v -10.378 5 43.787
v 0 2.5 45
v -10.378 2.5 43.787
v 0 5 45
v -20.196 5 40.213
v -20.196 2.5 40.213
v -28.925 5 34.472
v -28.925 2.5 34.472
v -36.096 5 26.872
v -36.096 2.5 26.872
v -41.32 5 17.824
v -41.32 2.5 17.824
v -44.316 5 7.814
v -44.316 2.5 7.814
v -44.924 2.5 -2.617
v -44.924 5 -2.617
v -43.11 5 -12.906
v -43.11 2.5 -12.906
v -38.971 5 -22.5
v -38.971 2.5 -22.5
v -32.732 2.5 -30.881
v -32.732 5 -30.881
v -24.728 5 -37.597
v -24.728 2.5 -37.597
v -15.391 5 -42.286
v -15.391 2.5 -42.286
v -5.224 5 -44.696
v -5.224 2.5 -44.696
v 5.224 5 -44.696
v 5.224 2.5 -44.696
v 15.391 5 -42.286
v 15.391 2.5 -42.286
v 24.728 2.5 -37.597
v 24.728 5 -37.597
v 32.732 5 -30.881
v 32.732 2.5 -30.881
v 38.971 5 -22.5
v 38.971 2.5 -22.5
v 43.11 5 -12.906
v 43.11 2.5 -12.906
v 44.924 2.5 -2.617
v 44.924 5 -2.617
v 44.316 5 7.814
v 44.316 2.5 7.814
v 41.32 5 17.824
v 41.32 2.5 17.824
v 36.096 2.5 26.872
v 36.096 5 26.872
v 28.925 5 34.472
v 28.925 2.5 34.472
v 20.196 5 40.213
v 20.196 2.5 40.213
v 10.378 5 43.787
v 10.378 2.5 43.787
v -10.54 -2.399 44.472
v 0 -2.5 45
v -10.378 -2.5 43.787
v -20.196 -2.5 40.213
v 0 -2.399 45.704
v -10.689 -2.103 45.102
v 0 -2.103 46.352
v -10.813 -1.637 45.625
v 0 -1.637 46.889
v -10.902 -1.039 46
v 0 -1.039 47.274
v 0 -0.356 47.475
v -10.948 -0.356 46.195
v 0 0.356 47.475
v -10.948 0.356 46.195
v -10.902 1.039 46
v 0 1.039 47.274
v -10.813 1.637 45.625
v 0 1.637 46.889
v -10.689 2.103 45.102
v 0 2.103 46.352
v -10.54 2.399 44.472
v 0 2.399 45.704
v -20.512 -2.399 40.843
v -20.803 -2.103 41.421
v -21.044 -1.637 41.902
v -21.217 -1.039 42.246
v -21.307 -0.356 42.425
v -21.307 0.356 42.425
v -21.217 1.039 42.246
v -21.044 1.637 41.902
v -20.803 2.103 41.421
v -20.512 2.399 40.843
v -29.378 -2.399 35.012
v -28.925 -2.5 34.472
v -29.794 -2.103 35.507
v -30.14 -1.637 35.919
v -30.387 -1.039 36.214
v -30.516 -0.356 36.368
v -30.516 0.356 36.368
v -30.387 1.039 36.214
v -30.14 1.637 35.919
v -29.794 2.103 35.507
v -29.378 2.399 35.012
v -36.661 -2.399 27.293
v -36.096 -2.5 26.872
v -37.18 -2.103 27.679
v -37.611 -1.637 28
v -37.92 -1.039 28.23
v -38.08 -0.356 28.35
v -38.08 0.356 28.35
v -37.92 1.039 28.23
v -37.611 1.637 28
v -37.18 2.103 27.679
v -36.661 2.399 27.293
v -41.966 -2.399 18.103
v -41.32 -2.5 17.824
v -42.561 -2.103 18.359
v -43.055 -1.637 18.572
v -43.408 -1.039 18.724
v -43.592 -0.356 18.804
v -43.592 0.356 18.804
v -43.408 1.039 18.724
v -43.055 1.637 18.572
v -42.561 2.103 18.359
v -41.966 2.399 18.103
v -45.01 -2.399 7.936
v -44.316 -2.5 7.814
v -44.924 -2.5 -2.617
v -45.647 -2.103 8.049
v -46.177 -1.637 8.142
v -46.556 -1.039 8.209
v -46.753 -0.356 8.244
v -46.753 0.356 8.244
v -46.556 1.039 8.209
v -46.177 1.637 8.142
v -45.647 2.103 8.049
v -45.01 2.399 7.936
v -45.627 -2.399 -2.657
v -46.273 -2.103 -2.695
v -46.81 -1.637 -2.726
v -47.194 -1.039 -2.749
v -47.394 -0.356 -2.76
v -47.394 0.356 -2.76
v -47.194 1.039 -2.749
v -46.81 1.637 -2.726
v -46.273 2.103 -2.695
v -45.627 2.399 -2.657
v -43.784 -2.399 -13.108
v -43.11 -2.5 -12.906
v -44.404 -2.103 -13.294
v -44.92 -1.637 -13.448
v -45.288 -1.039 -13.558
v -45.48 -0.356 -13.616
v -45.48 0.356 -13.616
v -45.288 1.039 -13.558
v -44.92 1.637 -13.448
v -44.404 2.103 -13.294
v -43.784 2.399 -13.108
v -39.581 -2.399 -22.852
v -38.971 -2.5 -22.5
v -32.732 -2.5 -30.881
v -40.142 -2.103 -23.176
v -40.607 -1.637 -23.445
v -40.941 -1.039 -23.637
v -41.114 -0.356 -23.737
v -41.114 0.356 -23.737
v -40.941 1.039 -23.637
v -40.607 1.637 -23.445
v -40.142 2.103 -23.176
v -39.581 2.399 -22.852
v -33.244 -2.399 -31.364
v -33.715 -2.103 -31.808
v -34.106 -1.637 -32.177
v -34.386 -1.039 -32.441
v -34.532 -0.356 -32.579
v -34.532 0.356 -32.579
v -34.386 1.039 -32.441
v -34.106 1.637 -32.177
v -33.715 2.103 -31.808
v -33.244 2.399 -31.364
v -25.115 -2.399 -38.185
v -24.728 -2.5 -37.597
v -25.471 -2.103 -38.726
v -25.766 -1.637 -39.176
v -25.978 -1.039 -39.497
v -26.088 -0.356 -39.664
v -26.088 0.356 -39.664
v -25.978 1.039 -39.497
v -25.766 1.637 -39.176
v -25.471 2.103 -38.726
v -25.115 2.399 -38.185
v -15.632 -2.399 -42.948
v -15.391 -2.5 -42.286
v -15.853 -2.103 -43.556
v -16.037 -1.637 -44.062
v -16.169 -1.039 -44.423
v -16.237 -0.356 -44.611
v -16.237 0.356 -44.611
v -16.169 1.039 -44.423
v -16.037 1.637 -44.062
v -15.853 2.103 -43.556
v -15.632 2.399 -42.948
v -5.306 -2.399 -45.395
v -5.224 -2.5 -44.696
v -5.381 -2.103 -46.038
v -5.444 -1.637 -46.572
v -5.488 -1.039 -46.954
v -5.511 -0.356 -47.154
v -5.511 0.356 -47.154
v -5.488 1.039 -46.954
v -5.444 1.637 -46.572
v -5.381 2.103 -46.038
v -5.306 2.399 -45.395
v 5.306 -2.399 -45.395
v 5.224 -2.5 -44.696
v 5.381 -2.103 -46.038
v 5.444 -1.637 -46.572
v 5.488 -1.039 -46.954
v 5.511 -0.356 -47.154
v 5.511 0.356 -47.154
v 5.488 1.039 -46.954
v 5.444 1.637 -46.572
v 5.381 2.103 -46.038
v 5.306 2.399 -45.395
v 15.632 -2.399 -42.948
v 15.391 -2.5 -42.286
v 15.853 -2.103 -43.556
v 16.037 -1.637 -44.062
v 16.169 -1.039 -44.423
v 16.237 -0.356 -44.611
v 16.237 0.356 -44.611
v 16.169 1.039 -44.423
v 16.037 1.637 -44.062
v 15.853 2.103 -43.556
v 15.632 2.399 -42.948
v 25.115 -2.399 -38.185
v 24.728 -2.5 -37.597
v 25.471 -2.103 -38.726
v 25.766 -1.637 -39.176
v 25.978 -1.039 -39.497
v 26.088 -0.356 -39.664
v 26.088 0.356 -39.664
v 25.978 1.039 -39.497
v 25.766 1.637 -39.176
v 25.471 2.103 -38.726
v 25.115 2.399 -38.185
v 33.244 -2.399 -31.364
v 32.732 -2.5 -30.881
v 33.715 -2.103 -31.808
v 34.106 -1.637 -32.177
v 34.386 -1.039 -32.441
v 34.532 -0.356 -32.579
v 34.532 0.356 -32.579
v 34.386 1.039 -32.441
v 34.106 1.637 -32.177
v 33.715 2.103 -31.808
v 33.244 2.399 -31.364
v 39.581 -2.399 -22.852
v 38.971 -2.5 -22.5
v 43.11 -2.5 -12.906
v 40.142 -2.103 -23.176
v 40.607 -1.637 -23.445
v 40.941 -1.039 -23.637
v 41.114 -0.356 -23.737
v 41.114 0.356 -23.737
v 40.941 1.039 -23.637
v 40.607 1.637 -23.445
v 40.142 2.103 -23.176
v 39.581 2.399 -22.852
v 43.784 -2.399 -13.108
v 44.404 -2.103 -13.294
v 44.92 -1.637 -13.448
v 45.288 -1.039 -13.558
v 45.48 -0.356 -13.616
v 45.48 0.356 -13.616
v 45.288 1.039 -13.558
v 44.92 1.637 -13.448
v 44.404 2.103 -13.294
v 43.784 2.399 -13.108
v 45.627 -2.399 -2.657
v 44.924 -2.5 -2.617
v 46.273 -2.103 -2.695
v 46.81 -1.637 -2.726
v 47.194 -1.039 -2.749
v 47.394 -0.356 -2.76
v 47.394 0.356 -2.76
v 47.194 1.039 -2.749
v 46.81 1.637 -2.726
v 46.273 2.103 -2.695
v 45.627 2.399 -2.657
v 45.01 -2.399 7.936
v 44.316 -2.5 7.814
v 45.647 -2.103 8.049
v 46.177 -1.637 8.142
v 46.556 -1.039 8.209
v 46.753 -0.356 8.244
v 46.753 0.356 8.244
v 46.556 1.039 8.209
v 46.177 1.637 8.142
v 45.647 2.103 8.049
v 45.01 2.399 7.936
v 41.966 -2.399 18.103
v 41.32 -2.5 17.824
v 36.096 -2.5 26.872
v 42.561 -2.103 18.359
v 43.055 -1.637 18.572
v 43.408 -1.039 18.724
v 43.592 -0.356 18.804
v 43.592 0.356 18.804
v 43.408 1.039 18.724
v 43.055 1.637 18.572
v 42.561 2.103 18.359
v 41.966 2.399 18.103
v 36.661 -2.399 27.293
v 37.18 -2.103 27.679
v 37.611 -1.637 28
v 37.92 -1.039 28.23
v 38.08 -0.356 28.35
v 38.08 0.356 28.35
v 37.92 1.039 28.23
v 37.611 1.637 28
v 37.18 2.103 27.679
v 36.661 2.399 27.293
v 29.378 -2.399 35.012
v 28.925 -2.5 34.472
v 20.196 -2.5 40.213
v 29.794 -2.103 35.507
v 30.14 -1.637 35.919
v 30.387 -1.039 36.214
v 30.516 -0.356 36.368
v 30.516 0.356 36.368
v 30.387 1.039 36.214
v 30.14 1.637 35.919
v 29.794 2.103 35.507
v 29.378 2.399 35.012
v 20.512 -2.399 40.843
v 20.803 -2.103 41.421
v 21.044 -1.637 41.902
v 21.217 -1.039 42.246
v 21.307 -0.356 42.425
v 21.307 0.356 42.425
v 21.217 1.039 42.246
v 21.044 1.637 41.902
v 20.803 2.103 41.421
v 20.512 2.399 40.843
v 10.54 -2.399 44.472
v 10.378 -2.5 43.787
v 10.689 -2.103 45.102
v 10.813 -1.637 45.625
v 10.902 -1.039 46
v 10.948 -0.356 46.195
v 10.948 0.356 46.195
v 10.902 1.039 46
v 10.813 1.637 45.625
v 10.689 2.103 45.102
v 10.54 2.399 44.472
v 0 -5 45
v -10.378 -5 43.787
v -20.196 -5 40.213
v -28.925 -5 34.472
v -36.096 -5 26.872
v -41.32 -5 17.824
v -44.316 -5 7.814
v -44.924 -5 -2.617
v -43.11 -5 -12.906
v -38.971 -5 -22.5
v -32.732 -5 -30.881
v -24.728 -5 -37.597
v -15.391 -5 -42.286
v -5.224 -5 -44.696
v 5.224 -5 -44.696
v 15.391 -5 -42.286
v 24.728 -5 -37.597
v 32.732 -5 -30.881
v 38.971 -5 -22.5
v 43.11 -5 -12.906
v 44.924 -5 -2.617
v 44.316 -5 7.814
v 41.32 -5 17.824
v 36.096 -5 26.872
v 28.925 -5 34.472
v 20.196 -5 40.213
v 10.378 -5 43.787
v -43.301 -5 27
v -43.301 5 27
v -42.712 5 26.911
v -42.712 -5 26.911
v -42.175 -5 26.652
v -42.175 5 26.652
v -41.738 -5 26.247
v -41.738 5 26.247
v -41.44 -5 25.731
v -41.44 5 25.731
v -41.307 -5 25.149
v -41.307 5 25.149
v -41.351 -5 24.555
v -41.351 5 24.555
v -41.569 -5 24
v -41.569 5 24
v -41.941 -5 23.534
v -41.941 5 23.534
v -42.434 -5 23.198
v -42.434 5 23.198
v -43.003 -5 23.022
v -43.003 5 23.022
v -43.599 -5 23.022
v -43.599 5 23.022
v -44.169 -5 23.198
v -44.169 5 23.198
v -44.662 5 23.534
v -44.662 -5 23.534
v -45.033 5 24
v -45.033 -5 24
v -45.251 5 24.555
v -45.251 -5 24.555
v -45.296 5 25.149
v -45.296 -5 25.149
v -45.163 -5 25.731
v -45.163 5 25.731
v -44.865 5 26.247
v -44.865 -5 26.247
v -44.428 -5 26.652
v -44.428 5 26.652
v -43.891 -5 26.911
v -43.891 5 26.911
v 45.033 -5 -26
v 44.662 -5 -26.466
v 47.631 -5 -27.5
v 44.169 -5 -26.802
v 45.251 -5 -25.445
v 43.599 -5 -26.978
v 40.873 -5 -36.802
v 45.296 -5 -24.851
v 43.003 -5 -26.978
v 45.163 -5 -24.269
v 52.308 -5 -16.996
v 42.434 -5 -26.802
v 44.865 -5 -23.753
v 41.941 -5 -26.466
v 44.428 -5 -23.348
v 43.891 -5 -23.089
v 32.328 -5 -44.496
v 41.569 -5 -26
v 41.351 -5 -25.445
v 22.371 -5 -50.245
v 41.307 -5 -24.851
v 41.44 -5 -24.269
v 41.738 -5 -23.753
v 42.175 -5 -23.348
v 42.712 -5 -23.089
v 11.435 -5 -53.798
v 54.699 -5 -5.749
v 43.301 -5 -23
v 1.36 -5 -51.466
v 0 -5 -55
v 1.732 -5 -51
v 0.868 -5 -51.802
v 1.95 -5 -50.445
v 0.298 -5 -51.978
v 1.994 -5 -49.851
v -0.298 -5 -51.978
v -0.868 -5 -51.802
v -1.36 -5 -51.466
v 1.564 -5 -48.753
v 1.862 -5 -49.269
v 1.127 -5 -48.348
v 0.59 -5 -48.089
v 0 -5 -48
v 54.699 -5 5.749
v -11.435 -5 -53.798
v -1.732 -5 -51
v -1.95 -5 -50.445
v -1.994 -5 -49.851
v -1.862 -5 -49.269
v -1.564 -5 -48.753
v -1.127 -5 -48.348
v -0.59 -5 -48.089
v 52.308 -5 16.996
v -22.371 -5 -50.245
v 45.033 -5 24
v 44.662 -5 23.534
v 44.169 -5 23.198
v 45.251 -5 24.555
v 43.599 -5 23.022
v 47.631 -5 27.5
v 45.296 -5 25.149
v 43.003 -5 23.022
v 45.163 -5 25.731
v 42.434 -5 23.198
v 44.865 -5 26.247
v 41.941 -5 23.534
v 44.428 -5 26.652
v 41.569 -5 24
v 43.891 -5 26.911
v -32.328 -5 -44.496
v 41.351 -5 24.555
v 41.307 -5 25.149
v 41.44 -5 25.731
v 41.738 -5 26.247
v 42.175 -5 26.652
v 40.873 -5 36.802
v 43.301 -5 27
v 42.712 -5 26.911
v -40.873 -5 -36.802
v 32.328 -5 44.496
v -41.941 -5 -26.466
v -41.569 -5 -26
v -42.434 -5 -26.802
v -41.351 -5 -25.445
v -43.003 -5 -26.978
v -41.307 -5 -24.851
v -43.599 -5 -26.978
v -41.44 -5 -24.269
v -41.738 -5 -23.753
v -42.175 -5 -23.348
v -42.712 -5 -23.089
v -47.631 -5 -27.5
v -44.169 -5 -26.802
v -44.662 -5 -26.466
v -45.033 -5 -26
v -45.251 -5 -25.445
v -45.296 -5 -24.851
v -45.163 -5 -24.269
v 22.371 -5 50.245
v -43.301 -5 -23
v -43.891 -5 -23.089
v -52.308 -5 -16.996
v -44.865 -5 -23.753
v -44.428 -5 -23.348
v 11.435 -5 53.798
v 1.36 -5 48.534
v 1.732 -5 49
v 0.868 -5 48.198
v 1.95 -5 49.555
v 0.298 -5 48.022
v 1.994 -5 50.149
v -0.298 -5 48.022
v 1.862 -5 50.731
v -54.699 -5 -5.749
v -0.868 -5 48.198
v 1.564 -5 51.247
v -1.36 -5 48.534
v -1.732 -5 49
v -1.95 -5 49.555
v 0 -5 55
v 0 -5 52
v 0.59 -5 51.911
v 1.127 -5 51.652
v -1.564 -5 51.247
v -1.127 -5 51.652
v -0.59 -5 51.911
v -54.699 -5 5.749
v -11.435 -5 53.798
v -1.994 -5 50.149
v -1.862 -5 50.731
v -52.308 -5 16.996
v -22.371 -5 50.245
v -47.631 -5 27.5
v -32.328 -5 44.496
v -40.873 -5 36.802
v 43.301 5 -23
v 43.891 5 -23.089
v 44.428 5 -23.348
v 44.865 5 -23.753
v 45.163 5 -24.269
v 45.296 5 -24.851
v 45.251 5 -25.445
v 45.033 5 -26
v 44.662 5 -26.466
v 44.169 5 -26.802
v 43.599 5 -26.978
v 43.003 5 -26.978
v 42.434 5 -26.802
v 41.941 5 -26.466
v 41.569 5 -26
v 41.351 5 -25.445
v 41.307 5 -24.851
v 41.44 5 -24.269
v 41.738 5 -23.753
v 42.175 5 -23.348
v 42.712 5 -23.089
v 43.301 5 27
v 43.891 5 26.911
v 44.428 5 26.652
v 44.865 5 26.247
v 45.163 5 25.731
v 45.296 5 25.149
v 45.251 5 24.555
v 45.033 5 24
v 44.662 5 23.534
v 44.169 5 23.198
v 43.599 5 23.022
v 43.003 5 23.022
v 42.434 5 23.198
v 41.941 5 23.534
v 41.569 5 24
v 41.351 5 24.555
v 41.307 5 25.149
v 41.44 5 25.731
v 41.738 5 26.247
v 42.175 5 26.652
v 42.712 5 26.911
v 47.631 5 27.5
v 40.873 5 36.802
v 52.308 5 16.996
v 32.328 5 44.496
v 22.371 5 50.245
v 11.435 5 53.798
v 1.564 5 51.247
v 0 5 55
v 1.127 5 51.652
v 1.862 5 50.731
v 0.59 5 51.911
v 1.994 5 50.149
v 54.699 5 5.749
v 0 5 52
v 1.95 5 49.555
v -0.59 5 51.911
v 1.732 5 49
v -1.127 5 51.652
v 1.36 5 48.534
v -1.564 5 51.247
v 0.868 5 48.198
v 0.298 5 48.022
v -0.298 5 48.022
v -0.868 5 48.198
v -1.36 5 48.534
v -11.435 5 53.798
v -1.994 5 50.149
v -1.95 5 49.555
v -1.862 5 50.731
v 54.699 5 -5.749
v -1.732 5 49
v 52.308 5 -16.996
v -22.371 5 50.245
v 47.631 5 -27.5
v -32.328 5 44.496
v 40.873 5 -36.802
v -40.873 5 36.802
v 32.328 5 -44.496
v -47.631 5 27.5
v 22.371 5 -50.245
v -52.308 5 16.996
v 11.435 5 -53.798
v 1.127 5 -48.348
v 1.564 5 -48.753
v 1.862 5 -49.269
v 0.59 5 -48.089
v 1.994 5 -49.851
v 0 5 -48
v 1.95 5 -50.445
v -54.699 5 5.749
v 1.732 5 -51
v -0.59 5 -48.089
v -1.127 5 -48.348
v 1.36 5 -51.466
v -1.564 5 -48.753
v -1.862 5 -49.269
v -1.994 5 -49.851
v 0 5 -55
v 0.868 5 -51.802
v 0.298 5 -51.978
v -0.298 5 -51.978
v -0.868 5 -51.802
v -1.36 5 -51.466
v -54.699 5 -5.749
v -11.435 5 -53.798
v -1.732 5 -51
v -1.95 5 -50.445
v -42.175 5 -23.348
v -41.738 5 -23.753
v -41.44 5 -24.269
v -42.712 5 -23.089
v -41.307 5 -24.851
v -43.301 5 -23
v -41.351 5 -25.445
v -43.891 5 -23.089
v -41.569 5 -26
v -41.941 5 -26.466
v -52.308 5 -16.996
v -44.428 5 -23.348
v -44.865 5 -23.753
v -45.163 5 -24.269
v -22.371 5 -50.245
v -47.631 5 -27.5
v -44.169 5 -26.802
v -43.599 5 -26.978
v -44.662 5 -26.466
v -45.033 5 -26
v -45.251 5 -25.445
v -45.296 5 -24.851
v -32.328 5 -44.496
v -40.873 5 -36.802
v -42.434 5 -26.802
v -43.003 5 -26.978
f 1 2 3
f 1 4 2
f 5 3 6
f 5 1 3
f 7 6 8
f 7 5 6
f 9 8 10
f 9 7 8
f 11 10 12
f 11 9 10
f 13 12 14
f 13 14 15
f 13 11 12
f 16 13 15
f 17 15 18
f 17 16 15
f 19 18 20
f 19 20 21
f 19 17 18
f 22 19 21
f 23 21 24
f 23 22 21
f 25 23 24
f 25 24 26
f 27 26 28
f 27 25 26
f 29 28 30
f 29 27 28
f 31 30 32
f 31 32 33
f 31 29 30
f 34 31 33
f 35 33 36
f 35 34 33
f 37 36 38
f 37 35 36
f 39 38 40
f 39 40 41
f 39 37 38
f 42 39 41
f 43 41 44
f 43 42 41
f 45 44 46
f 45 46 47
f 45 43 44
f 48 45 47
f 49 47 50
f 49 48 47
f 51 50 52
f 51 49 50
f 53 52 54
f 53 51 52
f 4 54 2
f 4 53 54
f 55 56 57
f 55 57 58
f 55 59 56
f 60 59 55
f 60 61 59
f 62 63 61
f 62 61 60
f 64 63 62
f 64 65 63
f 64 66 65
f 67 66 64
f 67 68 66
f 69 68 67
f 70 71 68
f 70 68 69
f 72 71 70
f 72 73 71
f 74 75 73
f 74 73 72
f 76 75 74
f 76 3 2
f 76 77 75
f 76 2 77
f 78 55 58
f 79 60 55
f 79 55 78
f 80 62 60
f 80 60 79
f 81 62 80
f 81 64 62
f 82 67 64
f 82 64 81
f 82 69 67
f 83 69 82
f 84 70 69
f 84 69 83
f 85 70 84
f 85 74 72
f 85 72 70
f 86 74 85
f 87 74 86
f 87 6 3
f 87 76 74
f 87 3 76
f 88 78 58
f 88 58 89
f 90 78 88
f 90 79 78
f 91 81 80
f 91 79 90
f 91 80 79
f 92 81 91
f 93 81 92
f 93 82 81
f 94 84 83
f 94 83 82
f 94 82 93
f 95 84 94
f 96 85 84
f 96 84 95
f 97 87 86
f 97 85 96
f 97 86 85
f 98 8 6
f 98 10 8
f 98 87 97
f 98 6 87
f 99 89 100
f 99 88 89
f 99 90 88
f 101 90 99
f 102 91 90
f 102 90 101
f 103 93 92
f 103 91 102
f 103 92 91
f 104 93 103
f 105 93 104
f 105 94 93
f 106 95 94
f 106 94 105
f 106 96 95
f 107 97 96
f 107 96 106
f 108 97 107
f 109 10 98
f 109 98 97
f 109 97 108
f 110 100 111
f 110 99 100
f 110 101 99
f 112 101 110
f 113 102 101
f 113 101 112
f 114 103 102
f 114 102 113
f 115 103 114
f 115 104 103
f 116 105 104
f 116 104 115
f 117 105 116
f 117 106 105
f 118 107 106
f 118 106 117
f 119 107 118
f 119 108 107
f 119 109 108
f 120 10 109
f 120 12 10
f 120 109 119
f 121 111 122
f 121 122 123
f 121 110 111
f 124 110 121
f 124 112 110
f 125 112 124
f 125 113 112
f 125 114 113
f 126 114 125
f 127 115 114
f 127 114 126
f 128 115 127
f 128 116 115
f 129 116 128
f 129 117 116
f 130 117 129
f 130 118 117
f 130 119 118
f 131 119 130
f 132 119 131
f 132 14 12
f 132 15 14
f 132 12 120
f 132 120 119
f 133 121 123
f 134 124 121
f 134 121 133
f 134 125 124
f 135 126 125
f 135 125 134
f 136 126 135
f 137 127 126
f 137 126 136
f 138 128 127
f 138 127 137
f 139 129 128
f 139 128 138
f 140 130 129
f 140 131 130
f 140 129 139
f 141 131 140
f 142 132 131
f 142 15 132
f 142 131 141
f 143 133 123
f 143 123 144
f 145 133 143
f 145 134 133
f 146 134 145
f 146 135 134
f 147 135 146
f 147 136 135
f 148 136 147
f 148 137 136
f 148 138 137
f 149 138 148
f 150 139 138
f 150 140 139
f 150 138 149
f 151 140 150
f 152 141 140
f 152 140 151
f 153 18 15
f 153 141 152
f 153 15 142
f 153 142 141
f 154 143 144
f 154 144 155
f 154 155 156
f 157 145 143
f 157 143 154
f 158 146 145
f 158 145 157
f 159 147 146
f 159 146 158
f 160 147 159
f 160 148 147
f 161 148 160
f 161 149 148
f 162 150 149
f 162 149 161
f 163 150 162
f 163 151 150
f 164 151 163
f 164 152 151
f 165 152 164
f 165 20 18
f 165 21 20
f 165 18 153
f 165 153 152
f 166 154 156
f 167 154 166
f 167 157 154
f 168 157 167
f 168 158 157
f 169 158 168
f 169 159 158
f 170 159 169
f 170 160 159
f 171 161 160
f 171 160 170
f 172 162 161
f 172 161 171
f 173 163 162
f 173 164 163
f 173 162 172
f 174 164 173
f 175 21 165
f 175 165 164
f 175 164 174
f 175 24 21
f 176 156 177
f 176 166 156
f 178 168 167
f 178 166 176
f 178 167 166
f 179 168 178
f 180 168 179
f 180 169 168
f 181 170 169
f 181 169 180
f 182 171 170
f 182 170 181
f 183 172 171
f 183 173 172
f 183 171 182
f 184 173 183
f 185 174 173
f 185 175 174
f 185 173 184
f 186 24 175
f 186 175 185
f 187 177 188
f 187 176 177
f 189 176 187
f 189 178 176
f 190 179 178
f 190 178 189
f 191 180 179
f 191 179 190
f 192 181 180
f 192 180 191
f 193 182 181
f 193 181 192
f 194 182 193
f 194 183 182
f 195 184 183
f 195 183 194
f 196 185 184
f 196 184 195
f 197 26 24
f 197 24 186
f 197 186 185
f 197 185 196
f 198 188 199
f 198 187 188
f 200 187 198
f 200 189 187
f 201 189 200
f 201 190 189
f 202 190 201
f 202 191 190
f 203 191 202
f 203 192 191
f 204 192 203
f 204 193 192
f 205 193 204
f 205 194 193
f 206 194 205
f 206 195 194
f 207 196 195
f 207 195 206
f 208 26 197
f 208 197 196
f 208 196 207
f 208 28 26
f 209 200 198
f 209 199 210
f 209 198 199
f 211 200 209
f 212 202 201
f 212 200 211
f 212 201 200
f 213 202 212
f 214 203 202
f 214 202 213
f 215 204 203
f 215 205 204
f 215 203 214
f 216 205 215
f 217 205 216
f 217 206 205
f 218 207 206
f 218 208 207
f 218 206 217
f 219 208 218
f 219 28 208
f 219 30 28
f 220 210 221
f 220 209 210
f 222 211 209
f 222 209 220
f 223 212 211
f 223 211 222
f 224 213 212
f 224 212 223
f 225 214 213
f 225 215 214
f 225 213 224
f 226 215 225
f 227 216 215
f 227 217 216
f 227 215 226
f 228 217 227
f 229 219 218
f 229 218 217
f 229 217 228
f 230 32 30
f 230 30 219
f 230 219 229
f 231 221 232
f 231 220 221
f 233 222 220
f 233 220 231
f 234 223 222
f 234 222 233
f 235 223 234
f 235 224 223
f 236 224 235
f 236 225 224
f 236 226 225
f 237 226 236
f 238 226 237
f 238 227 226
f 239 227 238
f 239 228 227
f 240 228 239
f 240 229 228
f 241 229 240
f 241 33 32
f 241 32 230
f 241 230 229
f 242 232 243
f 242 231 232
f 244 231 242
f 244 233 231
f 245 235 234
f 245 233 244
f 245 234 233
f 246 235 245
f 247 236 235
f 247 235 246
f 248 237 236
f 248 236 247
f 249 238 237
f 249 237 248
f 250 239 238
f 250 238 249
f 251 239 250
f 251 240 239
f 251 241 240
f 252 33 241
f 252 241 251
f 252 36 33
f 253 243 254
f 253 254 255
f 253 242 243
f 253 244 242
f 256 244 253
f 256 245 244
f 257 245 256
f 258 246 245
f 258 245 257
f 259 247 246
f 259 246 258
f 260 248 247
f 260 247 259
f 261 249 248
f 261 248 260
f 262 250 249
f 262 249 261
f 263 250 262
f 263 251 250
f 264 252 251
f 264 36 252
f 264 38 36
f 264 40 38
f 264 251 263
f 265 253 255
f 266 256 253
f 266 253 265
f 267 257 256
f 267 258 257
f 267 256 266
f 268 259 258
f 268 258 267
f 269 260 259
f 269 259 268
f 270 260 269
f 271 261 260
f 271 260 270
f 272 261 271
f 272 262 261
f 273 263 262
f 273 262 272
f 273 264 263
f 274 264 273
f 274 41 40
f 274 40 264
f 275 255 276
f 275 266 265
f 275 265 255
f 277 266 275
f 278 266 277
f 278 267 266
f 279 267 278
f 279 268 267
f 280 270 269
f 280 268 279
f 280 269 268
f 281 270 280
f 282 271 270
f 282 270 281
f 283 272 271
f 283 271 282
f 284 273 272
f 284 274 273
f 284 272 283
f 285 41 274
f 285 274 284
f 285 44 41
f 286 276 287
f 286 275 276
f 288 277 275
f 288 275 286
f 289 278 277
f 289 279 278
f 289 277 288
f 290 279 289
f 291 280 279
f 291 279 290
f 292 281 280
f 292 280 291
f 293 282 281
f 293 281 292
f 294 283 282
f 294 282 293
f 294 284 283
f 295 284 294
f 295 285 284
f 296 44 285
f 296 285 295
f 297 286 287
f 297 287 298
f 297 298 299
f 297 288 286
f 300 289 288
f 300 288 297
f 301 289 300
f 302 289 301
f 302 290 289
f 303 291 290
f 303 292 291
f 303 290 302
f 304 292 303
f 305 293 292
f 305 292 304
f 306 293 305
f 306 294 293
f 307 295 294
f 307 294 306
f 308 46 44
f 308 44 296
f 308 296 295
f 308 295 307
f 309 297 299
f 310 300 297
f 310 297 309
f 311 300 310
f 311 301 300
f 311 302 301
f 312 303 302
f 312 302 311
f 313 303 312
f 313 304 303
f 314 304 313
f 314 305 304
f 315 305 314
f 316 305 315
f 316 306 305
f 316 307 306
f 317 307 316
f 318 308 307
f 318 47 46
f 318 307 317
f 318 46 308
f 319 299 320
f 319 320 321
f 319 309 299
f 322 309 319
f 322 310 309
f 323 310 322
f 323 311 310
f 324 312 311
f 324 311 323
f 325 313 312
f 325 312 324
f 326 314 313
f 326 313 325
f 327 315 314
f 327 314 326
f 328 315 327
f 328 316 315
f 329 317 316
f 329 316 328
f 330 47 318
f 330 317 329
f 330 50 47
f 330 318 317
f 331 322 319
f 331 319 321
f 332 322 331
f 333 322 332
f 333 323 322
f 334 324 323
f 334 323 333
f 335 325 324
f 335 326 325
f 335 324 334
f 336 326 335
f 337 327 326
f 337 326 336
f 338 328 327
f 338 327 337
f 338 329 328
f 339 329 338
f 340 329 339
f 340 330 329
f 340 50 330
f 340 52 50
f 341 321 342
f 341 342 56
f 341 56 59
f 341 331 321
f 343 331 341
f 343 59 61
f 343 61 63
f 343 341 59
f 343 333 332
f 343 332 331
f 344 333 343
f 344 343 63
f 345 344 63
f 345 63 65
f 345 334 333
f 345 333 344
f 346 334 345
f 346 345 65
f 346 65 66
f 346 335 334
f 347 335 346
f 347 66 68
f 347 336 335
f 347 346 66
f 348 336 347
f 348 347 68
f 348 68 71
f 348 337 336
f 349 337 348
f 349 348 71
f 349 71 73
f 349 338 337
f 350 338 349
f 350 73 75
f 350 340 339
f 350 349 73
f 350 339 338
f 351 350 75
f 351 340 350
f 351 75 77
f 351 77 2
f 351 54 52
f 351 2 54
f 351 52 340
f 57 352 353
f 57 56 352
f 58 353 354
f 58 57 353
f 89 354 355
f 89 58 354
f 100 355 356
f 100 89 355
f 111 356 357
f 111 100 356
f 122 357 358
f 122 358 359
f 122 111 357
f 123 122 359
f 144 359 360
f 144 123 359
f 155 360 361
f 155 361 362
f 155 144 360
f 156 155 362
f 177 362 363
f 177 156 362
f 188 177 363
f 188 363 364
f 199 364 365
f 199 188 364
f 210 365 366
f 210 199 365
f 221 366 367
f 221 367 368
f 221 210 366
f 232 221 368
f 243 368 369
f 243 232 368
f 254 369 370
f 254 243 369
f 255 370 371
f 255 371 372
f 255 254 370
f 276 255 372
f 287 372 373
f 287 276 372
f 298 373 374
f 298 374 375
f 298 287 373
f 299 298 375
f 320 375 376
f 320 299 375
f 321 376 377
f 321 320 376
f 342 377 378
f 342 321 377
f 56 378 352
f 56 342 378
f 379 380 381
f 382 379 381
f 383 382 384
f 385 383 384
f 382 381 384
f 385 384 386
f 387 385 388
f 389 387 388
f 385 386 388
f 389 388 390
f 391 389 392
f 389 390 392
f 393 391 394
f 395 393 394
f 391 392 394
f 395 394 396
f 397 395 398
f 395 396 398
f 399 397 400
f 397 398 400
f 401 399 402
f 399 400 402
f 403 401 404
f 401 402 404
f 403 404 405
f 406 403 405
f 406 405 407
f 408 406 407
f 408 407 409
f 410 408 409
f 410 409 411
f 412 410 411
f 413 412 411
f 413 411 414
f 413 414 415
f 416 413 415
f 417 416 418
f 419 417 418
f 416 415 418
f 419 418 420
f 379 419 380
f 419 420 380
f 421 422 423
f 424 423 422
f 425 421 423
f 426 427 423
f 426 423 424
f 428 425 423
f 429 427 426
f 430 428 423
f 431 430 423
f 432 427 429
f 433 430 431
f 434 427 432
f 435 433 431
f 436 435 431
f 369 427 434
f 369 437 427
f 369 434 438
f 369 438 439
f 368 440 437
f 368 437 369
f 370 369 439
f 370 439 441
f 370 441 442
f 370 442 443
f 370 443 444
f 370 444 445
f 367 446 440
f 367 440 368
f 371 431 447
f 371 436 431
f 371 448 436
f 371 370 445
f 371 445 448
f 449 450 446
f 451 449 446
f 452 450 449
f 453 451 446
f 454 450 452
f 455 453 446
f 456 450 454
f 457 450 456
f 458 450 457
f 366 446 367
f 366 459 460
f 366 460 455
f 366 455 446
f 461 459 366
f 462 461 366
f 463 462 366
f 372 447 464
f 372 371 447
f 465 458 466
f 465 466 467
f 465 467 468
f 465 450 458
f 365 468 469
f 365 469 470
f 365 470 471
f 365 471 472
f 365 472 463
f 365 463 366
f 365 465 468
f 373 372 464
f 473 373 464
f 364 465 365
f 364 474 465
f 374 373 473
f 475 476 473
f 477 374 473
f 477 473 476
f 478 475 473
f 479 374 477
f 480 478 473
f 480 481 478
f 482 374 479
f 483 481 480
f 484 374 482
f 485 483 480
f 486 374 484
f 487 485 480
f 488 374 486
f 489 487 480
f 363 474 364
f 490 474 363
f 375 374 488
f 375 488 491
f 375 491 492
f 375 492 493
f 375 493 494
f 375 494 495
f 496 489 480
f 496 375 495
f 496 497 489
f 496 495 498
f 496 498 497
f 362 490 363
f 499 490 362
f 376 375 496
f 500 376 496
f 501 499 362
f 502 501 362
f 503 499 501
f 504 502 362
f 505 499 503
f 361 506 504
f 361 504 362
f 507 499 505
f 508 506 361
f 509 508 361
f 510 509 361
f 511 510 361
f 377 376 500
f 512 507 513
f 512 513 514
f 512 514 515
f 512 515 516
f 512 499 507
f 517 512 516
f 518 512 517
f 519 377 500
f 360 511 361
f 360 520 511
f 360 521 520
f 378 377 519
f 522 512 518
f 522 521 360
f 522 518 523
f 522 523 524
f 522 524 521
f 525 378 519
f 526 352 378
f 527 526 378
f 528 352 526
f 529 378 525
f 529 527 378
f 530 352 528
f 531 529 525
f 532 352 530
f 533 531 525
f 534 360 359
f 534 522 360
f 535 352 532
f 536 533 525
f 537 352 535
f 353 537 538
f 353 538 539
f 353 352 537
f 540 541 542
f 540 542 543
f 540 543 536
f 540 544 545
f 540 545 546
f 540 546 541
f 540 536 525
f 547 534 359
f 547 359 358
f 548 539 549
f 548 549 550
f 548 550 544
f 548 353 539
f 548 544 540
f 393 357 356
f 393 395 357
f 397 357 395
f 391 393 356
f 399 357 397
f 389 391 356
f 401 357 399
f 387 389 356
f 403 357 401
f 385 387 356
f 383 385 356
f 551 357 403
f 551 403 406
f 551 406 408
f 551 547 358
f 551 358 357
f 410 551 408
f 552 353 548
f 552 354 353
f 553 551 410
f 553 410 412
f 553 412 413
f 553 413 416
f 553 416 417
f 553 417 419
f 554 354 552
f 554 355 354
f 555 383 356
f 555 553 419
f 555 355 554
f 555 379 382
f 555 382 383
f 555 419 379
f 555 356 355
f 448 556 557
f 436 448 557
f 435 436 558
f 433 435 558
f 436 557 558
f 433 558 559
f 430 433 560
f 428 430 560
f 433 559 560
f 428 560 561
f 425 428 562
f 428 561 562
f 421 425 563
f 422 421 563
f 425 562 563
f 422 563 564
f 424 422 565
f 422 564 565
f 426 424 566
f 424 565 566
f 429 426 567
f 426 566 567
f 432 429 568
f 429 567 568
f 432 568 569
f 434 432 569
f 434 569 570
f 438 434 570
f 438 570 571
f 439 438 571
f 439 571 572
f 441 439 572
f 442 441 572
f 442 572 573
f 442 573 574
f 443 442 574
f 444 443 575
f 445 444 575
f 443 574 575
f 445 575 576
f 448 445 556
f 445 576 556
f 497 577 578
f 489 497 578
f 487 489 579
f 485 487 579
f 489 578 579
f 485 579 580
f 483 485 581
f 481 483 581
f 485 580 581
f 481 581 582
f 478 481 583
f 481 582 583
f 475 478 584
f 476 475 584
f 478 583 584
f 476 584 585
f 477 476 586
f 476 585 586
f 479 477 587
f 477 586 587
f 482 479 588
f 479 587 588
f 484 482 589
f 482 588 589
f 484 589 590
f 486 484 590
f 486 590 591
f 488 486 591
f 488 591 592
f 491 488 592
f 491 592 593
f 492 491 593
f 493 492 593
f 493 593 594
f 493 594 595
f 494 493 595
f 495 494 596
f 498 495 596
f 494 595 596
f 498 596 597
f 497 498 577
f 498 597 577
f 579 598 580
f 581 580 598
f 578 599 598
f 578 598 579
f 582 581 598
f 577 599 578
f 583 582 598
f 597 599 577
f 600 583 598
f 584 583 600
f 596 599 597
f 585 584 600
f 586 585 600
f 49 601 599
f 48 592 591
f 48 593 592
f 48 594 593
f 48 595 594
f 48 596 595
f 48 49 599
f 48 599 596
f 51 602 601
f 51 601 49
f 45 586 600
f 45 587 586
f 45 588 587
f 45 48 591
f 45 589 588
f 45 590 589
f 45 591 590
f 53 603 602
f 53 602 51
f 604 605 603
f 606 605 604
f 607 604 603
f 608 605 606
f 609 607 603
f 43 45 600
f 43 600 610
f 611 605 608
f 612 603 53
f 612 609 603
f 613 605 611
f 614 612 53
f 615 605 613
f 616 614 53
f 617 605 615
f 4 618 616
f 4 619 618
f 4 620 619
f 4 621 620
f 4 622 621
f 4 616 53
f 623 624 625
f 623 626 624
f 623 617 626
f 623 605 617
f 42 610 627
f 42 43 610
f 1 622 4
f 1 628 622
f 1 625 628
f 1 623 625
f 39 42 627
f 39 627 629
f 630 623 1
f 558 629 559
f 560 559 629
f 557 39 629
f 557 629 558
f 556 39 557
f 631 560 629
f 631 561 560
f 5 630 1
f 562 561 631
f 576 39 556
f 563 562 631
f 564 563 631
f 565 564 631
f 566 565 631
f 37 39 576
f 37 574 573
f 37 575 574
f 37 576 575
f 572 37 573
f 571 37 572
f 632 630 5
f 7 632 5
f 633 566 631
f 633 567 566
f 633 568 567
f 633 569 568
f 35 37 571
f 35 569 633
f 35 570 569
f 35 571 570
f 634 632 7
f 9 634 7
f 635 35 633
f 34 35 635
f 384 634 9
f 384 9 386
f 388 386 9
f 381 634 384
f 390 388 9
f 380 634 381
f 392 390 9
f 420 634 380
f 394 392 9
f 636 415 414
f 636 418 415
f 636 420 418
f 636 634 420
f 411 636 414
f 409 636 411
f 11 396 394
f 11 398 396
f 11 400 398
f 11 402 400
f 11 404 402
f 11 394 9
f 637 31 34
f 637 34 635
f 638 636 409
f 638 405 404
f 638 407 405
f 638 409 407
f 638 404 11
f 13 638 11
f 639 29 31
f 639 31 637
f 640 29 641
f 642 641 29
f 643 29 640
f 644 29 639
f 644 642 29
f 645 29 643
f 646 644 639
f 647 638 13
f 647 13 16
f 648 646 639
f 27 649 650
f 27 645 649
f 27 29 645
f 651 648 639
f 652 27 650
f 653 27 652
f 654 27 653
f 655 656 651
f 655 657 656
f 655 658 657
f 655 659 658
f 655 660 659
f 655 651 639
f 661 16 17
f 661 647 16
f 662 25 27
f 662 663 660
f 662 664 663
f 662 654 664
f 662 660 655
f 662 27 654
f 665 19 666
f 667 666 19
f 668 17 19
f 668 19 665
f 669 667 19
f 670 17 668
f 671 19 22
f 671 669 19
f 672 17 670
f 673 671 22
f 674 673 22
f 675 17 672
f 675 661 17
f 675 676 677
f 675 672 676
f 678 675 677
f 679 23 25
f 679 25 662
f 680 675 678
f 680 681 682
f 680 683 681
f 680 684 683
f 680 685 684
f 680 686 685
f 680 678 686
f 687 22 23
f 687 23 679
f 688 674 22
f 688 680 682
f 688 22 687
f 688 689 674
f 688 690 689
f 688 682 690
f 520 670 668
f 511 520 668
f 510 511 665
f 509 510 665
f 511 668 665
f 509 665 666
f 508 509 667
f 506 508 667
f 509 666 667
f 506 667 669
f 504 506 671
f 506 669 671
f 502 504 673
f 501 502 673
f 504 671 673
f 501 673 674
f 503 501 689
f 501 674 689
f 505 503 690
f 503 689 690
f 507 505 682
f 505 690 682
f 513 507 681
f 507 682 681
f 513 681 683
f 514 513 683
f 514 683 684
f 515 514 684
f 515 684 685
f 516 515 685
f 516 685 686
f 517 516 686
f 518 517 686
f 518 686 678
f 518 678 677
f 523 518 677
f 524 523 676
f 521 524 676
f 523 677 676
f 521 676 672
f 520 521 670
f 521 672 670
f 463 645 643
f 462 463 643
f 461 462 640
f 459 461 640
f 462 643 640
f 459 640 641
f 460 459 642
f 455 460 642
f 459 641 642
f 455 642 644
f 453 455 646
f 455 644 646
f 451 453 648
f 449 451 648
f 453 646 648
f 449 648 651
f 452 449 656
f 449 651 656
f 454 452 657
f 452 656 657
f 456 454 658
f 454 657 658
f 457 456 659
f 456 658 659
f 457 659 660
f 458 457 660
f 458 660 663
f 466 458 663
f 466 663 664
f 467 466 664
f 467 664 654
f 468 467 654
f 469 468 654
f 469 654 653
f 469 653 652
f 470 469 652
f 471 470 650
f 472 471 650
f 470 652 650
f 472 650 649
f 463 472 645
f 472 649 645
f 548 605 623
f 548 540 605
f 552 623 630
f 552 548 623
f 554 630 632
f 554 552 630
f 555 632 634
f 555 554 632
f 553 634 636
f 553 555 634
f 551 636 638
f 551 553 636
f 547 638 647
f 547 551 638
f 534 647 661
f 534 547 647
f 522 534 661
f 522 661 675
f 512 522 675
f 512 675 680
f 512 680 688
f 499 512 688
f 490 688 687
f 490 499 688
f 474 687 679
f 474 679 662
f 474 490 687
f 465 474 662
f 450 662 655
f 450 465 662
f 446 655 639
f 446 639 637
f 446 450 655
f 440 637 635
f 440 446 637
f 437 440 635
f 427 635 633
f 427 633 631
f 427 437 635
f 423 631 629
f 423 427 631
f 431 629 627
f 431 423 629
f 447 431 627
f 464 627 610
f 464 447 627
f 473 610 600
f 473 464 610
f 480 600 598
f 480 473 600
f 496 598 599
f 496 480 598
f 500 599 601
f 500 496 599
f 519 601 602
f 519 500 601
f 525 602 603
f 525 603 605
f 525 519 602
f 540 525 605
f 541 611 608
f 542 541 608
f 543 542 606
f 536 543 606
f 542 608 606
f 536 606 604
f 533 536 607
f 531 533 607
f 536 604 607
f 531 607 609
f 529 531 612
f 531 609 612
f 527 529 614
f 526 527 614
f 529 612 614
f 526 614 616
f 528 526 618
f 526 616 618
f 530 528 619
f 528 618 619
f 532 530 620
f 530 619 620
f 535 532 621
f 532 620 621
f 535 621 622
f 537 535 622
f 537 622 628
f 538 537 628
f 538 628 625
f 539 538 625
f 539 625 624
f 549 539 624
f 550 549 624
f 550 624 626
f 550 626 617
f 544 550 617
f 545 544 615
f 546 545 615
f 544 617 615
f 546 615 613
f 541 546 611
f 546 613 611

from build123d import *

# Parameters (mm, degrees)
CROQUIS2_R            = 2
CORTAR_EXTRUIR1_DEPTH = 10


with BuildPart() as part:
    # Croquis1 → Revolución1 (revolve)
    with BuildSketch(Plane(origin=(0, 0, 0), x_dir=(0, 0, -1), z_dir=(1, 0, 0))):
        with BuildLine():
            Line((-45, 2.5), (-45, 5))
            Line((-45, 5), (-55, 5))
            Line((-55, 5), (-55, -5))
            Line((-55, -5), (-45, -5))
            Line((-45, -5), (-45, -2.5))
            ThreePointArc((-45, -2.5), (-47.5, 0), (-45, 2.5))
        make_face()
    revolve(axis=Axis((0, 59.07084426, 0), (0, -1, 0)))

    # Croquis2 → Cortar-Extruir1 (cut)
    with BuildSketch(Plane(origin=(0, 5, 0), x_dir=(1, 0, 0), z_dir=(0, 1, 0))):
        with Locations(Location((0, 50, 0), (0, 0, 270))):
            Circle(CROQUIS2_R)
        with Locations(Location((43.301270189, 25, 0), (0, 0, 270))):
            Circle(CROQUIS2_R)
        with Locations(Location((43.301270189, -25, 0), (0, 0, 270))):
            Circle(CROQUIS2_R)
        with Locations(Location((0, -50, 0), (0, 0, 270))):
            Circle(CROQUIS2_R)
        with Locations(Location((-43.301270189, -25, 0), (0, 0, 270))):
            Circle(CROQUIS2_R)
        with Locations(Location((-43.301270189, 25, 0), (0, 0, 270))):
            Circle(CROQUIS2_R)
    extrude(amount=-CORTAR_EXTRUIR1_DEPTH, mode=Mode.SUBTRACT)


solid = part.part
